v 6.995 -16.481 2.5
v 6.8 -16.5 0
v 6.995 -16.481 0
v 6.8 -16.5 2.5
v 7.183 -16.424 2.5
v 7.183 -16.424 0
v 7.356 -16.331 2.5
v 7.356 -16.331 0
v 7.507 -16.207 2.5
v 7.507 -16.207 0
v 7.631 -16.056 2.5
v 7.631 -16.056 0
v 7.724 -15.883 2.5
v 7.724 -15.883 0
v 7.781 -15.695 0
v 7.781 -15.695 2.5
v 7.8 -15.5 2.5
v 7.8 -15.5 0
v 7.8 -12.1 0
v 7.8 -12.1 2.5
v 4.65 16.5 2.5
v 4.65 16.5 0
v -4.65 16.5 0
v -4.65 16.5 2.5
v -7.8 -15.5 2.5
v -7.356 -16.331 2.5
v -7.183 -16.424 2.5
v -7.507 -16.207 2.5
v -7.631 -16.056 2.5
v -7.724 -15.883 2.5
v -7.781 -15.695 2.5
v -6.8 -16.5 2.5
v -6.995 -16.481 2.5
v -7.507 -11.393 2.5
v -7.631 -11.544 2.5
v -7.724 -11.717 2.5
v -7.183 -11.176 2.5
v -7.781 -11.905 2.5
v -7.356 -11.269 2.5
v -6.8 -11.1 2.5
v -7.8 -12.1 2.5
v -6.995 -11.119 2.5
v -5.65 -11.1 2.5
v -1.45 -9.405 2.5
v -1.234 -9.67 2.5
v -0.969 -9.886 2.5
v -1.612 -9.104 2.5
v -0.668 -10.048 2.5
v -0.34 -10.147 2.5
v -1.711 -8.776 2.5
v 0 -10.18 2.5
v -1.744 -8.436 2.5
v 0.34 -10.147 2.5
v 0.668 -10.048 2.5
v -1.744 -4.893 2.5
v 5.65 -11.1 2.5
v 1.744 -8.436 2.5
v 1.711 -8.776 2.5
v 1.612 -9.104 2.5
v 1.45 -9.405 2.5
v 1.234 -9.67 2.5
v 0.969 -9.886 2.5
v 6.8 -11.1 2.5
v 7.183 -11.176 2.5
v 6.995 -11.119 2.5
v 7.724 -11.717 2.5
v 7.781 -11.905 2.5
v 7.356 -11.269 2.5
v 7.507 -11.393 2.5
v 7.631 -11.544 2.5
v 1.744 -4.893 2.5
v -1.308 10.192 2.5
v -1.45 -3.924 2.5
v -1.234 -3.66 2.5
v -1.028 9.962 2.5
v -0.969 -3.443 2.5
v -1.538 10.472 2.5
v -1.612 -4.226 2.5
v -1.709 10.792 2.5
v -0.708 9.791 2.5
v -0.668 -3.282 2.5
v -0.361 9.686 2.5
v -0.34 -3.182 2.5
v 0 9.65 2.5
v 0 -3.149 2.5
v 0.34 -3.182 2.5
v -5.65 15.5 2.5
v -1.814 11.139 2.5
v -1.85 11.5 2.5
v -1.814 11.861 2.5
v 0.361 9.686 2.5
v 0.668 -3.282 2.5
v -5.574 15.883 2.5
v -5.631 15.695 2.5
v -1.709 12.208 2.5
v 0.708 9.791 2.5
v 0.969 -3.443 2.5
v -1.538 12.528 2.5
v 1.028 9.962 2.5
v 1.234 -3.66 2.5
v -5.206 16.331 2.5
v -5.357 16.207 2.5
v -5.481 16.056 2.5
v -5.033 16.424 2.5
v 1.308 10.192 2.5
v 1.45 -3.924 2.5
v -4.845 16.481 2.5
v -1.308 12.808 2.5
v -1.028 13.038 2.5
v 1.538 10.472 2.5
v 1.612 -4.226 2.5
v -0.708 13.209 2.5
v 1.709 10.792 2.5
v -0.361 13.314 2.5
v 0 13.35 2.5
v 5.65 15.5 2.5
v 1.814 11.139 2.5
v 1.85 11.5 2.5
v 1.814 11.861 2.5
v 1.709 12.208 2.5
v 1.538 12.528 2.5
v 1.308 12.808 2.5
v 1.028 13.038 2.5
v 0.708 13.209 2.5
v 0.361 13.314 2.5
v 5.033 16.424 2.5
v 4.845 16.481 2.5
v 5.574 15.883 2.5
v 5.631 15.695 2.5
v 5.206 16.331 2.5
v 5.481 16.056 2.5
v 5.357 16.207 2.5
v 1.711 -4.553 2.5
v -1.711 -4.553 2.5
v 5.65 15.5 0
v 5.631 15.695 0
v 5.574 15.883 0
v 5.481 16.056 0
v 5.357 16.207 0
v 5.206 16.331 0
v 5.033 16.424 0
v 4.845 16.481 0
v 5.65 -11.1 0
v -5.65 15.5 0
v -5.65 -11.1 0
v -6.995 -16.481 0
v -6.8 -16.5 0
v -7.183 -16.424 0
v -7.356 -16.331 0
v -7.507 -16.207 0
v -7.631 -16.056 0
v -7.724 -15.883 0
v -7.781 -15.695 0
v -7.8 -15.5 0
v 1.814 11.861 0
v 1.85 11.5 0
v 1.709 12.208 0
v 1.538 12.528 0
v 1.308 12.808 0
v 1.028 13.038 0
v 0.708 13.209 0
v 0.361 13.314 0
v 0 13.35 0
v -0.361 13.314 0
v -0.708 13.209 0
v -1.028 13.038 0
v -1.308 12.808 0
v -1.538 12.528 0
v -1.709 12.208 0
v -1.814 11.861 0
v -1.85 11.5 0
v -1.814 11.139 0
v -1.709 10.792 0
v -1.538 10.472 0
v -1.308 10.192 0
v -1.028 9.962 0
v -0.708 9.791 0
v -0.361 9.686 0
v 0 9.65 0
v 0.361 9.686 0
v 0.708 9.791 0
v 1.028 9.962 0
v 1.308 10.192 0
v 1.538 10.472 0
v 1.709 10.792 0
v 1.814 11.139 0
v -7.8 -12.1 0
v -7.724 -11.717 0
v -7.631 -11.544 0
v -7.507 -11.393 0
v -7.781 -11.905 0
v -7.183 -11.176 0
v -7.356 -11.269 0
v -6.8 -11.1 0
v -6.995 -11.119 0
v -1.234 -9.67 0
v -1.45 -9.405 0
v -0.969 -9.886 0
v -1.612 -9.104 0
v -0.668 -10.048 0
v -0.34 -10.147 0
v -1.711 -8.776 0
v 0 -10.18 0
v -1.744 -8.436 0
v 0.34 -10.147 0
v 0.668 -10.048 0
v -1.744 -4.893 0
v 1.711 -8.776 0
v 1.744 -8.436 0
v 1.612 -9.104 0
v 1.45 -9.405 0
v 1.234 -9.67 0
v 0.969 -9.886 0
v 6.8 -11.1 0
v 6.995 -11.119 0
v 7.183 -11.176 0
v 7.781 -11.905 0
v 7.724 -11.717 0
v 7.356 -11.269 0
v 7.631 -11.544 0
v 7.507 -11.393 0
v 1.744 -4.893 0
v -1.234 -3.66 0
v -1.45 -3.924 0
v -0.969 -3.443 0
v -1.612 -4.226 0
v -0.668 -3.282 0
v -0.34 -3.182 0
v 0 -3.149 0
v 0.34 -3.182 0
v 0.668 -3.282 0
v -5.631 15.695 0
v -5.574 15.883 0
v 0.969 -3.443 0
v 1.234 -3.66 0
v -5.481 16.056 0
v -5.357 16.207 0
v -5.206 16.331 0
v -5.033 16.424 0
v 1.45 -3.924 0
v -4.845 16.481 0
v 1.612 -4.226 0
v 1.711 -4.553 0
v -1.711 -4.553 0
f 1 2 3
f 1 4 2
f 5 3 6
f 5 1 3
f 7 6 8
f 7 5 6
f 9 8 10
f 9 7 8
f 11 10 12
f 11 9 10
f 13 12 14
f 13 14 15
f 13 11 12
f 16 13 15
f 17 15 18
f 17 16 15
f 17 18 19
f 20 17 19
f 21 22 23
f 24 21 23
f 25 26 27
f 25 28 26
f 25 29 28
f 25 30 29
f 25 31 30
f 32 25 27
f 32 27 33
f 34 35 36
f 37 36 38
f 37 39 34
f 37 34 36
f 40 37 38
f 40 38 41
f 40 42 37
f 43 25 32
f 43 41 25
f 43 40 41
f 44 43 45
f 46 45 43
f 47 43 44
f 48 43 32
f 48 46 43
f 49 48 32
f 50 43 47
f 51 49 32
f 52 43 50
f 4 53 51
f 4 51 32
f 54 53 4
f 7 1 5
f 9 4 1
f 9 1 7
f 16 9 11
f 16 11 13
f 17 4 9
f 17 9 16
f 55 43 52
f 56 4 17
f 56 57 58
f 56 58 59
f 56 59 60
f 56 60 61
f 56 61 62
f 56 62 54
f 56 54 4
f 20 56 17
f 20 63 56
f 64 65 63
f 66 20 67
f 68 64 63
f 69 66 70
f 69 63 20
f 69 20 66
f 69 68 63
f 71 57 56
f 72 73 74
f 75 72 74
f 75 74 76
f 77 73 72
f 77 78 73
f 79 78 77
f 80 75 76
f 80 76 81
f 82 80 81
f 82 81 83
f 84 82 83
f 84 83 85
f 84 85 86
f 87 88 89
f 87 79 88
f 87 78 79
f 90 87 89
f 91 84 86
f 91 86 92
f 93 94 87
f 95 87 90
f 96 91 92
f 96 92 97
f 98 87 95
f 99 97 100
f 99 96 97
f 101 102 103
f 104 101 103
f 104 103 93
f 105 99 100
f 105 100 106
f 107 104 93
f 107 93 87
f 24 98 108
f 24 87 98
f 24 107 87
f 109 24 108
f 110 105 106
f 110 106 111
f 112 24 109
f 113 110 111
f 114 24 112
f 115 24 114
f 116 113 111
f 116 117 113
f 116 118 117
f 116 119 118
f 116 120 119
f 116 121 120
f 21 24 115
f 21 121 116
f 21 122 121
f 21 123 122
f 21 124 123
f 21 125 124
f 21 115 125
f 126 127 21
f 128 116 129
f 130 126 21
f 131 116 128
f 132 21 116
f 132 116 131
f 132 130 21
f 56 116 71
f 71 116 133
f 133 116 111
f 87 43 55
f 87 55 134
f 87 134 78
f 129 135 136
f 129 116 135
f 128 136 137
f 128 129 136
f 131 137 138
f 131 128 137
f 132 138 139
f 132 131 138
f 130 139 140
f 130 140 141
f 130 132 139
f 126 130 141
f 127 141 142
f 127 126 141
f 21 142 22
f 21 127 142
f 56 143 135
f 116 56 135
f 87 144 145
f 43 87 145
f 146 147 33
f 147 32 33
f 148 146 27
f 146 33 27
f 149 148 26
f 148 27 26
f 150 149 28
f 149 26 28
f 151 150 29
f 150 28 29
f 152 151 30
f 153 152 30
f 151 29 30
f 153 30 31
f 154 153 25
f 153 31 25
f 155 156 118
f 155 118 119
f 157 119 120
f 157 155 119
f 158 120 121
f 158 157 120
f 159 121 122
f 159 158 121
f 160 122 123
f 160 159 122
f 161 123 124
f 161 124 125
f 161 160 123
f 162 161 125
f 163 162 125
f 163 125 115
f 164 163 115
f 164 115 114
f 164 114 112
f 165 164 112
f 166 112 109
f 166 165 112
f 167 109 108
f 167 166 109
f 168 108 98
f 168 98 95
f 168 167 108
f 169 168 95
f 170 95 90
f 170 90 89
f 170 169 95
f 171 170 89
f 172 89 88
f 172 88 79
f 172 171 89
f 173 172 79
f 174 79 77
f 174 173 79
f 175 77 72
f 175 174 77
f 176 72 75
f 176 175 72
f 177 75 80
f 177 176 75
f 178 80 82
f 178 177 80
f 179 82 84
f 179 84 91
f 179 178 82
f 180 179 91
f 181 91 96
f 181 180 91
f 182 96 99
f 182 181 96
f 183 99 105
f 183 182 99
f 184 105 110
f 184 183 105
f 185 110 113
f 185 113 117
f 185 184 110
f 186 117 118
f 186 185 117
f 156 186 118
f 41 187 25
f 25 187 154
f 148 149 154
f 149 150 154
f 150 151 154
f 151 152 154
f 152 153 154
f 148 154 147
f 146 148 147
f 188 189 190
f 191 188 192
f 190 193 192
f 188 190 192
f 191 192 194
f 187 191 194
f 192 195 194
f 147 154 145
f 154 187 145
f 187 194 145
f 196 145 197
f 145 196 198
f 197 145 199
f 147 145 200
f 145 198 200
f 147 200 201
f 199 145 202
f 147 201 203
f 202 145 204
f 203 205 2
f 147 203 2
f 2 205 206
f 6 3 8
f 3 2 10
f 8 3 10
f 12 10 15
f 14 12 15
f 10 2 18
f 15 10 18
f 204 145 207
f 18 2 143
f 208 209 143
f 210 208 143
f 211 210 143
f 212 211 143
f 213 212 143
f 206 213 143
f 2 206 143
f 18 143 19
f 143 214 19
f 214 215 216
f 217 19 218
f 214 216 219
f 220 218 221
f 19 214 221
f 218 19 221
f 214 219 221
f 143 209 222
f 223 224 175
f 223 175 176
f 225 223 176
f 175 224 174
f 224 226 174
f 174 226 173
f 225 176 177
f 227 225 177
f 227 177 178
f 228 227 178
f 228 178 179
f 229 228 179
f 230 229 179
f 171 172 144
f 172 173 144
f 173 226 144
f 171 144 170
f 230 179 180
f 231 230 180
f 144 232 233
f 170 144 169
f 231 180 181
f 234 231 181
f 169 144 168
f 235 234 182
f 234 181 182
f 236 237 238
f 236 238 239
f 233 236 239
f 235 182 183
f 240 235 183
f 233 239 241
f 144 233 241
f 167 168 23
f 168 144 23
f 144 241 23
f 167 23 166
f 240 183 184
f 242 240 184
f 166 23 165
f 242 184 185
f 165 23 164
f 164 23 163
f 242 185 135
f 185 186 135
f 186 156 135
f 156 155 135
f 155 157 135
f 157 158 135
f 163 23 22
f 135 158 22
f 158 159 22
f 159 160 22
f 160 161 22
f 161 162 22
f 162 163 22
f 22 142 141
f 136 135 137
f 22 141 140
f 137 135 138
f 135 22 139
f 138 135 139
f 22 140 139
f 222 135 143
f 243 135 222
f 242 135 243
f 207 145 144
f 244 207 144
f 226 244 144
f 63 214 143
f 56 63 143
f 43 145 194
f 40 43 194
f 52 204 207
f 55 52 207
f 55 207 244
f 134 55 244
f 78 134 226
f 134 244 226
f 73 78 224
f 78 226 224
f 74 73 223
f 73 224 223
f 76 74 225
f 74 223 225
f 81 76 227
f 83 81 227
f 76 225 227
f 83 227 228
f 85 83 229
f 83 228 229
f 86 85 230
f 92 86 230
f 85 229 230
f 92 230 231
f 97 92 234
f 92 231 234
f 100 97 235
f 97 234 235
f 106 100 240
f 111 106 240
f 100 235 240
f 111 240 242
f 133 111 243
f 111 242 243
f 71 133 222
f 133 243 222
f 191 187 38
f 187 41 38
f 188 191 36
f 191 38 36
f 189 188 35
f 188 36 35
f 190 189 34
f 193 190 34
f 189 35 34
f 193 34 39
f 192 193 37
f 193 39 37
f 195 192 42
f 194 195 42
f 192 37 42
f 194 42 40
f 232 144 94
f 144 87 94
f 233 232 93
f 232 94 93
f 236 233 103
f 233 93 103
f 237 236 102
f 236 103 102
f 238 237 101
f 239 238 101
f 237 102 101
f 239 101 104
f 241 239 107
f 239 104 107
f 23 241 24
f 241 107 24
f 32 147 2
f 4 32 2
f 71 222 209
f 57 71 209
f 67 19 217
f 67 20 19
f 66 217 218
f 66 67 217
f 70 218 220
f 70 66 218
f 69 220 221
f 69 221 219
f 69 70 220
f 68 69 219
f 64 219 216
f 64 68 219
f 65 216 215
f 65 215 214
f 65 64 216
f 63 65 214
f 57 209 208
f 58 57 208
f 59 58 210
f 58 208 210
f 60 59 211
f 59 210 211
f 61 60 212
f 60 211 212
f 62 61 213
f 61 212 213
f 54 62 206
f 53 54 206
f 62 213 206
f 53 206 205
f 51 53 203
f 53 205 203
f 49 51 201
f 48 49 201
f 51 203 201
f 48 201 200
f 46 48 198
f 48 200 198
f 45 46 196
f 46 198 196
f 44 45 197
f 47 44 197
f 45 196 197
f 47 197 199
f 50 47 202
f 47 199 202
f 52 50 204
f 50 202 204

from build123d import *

# Parameters (mm, degrees)
CROQUIS1_R              = 1.85
SALIENTE_EXTRUIR1_DEPTH = 2.5
REDONDEO1_R             = 1


with BuildPart() as part:
    # Croquis1 → Saliente-Extruir1 (new body)
    with BuildSketch(Plane.XY):
        Polygon((-7.8, -16.5), (-5.65, -16.5), (0, -16.5), (5.65, -16.5), (7.8, -16.5), (7.8, -11.1), (5.65, -11.1), (5.65, 16.5), (-5.65, 16.5), (-5.65, -11.1), (-7.8, -11.1), align=None)
        with BuildLine():
            ThreePointArc((1.744493193, -8.435965803), (0, -10.180458996), (-1.744493193, -8.435965803))
            Line((-1.744493193, -8.435965803), (-1.744493193, -4.893383092))
            ThreePointArc((-1.744493193, -4.893383092), (0, -3.148889899), (1.744493193, -4.893383092))
            Line((1.744493193, -4.893383092), (1.744493193, -8.435965803))
        make_face(mode=Mode.SUBTRACT)
        with Locations((0, 11.5)):
            Circle(CROQUIS1_R, mode=Mode.SUBTRACT)
    extrude(amount=SALIENTE_EXTRUIR1_DEPTH)

    # Redondeo1
    redondeo1_edges = [part.edges().sort_by_distance(p)[0] for p in [
        (7.8, -11.1, 1.25),
        (7.8, -16.5, 1.25),
        (-7.8, -16.5, 1.25),
        (-7.8, -11.1, 1.25),
        (-5.65, 16.5, 1.25),
        (5.65, 16.5, 1.25),
    ]]
    fillet(redondeo1_edges, radius=REDONDEO1_R)


solid = part.part
